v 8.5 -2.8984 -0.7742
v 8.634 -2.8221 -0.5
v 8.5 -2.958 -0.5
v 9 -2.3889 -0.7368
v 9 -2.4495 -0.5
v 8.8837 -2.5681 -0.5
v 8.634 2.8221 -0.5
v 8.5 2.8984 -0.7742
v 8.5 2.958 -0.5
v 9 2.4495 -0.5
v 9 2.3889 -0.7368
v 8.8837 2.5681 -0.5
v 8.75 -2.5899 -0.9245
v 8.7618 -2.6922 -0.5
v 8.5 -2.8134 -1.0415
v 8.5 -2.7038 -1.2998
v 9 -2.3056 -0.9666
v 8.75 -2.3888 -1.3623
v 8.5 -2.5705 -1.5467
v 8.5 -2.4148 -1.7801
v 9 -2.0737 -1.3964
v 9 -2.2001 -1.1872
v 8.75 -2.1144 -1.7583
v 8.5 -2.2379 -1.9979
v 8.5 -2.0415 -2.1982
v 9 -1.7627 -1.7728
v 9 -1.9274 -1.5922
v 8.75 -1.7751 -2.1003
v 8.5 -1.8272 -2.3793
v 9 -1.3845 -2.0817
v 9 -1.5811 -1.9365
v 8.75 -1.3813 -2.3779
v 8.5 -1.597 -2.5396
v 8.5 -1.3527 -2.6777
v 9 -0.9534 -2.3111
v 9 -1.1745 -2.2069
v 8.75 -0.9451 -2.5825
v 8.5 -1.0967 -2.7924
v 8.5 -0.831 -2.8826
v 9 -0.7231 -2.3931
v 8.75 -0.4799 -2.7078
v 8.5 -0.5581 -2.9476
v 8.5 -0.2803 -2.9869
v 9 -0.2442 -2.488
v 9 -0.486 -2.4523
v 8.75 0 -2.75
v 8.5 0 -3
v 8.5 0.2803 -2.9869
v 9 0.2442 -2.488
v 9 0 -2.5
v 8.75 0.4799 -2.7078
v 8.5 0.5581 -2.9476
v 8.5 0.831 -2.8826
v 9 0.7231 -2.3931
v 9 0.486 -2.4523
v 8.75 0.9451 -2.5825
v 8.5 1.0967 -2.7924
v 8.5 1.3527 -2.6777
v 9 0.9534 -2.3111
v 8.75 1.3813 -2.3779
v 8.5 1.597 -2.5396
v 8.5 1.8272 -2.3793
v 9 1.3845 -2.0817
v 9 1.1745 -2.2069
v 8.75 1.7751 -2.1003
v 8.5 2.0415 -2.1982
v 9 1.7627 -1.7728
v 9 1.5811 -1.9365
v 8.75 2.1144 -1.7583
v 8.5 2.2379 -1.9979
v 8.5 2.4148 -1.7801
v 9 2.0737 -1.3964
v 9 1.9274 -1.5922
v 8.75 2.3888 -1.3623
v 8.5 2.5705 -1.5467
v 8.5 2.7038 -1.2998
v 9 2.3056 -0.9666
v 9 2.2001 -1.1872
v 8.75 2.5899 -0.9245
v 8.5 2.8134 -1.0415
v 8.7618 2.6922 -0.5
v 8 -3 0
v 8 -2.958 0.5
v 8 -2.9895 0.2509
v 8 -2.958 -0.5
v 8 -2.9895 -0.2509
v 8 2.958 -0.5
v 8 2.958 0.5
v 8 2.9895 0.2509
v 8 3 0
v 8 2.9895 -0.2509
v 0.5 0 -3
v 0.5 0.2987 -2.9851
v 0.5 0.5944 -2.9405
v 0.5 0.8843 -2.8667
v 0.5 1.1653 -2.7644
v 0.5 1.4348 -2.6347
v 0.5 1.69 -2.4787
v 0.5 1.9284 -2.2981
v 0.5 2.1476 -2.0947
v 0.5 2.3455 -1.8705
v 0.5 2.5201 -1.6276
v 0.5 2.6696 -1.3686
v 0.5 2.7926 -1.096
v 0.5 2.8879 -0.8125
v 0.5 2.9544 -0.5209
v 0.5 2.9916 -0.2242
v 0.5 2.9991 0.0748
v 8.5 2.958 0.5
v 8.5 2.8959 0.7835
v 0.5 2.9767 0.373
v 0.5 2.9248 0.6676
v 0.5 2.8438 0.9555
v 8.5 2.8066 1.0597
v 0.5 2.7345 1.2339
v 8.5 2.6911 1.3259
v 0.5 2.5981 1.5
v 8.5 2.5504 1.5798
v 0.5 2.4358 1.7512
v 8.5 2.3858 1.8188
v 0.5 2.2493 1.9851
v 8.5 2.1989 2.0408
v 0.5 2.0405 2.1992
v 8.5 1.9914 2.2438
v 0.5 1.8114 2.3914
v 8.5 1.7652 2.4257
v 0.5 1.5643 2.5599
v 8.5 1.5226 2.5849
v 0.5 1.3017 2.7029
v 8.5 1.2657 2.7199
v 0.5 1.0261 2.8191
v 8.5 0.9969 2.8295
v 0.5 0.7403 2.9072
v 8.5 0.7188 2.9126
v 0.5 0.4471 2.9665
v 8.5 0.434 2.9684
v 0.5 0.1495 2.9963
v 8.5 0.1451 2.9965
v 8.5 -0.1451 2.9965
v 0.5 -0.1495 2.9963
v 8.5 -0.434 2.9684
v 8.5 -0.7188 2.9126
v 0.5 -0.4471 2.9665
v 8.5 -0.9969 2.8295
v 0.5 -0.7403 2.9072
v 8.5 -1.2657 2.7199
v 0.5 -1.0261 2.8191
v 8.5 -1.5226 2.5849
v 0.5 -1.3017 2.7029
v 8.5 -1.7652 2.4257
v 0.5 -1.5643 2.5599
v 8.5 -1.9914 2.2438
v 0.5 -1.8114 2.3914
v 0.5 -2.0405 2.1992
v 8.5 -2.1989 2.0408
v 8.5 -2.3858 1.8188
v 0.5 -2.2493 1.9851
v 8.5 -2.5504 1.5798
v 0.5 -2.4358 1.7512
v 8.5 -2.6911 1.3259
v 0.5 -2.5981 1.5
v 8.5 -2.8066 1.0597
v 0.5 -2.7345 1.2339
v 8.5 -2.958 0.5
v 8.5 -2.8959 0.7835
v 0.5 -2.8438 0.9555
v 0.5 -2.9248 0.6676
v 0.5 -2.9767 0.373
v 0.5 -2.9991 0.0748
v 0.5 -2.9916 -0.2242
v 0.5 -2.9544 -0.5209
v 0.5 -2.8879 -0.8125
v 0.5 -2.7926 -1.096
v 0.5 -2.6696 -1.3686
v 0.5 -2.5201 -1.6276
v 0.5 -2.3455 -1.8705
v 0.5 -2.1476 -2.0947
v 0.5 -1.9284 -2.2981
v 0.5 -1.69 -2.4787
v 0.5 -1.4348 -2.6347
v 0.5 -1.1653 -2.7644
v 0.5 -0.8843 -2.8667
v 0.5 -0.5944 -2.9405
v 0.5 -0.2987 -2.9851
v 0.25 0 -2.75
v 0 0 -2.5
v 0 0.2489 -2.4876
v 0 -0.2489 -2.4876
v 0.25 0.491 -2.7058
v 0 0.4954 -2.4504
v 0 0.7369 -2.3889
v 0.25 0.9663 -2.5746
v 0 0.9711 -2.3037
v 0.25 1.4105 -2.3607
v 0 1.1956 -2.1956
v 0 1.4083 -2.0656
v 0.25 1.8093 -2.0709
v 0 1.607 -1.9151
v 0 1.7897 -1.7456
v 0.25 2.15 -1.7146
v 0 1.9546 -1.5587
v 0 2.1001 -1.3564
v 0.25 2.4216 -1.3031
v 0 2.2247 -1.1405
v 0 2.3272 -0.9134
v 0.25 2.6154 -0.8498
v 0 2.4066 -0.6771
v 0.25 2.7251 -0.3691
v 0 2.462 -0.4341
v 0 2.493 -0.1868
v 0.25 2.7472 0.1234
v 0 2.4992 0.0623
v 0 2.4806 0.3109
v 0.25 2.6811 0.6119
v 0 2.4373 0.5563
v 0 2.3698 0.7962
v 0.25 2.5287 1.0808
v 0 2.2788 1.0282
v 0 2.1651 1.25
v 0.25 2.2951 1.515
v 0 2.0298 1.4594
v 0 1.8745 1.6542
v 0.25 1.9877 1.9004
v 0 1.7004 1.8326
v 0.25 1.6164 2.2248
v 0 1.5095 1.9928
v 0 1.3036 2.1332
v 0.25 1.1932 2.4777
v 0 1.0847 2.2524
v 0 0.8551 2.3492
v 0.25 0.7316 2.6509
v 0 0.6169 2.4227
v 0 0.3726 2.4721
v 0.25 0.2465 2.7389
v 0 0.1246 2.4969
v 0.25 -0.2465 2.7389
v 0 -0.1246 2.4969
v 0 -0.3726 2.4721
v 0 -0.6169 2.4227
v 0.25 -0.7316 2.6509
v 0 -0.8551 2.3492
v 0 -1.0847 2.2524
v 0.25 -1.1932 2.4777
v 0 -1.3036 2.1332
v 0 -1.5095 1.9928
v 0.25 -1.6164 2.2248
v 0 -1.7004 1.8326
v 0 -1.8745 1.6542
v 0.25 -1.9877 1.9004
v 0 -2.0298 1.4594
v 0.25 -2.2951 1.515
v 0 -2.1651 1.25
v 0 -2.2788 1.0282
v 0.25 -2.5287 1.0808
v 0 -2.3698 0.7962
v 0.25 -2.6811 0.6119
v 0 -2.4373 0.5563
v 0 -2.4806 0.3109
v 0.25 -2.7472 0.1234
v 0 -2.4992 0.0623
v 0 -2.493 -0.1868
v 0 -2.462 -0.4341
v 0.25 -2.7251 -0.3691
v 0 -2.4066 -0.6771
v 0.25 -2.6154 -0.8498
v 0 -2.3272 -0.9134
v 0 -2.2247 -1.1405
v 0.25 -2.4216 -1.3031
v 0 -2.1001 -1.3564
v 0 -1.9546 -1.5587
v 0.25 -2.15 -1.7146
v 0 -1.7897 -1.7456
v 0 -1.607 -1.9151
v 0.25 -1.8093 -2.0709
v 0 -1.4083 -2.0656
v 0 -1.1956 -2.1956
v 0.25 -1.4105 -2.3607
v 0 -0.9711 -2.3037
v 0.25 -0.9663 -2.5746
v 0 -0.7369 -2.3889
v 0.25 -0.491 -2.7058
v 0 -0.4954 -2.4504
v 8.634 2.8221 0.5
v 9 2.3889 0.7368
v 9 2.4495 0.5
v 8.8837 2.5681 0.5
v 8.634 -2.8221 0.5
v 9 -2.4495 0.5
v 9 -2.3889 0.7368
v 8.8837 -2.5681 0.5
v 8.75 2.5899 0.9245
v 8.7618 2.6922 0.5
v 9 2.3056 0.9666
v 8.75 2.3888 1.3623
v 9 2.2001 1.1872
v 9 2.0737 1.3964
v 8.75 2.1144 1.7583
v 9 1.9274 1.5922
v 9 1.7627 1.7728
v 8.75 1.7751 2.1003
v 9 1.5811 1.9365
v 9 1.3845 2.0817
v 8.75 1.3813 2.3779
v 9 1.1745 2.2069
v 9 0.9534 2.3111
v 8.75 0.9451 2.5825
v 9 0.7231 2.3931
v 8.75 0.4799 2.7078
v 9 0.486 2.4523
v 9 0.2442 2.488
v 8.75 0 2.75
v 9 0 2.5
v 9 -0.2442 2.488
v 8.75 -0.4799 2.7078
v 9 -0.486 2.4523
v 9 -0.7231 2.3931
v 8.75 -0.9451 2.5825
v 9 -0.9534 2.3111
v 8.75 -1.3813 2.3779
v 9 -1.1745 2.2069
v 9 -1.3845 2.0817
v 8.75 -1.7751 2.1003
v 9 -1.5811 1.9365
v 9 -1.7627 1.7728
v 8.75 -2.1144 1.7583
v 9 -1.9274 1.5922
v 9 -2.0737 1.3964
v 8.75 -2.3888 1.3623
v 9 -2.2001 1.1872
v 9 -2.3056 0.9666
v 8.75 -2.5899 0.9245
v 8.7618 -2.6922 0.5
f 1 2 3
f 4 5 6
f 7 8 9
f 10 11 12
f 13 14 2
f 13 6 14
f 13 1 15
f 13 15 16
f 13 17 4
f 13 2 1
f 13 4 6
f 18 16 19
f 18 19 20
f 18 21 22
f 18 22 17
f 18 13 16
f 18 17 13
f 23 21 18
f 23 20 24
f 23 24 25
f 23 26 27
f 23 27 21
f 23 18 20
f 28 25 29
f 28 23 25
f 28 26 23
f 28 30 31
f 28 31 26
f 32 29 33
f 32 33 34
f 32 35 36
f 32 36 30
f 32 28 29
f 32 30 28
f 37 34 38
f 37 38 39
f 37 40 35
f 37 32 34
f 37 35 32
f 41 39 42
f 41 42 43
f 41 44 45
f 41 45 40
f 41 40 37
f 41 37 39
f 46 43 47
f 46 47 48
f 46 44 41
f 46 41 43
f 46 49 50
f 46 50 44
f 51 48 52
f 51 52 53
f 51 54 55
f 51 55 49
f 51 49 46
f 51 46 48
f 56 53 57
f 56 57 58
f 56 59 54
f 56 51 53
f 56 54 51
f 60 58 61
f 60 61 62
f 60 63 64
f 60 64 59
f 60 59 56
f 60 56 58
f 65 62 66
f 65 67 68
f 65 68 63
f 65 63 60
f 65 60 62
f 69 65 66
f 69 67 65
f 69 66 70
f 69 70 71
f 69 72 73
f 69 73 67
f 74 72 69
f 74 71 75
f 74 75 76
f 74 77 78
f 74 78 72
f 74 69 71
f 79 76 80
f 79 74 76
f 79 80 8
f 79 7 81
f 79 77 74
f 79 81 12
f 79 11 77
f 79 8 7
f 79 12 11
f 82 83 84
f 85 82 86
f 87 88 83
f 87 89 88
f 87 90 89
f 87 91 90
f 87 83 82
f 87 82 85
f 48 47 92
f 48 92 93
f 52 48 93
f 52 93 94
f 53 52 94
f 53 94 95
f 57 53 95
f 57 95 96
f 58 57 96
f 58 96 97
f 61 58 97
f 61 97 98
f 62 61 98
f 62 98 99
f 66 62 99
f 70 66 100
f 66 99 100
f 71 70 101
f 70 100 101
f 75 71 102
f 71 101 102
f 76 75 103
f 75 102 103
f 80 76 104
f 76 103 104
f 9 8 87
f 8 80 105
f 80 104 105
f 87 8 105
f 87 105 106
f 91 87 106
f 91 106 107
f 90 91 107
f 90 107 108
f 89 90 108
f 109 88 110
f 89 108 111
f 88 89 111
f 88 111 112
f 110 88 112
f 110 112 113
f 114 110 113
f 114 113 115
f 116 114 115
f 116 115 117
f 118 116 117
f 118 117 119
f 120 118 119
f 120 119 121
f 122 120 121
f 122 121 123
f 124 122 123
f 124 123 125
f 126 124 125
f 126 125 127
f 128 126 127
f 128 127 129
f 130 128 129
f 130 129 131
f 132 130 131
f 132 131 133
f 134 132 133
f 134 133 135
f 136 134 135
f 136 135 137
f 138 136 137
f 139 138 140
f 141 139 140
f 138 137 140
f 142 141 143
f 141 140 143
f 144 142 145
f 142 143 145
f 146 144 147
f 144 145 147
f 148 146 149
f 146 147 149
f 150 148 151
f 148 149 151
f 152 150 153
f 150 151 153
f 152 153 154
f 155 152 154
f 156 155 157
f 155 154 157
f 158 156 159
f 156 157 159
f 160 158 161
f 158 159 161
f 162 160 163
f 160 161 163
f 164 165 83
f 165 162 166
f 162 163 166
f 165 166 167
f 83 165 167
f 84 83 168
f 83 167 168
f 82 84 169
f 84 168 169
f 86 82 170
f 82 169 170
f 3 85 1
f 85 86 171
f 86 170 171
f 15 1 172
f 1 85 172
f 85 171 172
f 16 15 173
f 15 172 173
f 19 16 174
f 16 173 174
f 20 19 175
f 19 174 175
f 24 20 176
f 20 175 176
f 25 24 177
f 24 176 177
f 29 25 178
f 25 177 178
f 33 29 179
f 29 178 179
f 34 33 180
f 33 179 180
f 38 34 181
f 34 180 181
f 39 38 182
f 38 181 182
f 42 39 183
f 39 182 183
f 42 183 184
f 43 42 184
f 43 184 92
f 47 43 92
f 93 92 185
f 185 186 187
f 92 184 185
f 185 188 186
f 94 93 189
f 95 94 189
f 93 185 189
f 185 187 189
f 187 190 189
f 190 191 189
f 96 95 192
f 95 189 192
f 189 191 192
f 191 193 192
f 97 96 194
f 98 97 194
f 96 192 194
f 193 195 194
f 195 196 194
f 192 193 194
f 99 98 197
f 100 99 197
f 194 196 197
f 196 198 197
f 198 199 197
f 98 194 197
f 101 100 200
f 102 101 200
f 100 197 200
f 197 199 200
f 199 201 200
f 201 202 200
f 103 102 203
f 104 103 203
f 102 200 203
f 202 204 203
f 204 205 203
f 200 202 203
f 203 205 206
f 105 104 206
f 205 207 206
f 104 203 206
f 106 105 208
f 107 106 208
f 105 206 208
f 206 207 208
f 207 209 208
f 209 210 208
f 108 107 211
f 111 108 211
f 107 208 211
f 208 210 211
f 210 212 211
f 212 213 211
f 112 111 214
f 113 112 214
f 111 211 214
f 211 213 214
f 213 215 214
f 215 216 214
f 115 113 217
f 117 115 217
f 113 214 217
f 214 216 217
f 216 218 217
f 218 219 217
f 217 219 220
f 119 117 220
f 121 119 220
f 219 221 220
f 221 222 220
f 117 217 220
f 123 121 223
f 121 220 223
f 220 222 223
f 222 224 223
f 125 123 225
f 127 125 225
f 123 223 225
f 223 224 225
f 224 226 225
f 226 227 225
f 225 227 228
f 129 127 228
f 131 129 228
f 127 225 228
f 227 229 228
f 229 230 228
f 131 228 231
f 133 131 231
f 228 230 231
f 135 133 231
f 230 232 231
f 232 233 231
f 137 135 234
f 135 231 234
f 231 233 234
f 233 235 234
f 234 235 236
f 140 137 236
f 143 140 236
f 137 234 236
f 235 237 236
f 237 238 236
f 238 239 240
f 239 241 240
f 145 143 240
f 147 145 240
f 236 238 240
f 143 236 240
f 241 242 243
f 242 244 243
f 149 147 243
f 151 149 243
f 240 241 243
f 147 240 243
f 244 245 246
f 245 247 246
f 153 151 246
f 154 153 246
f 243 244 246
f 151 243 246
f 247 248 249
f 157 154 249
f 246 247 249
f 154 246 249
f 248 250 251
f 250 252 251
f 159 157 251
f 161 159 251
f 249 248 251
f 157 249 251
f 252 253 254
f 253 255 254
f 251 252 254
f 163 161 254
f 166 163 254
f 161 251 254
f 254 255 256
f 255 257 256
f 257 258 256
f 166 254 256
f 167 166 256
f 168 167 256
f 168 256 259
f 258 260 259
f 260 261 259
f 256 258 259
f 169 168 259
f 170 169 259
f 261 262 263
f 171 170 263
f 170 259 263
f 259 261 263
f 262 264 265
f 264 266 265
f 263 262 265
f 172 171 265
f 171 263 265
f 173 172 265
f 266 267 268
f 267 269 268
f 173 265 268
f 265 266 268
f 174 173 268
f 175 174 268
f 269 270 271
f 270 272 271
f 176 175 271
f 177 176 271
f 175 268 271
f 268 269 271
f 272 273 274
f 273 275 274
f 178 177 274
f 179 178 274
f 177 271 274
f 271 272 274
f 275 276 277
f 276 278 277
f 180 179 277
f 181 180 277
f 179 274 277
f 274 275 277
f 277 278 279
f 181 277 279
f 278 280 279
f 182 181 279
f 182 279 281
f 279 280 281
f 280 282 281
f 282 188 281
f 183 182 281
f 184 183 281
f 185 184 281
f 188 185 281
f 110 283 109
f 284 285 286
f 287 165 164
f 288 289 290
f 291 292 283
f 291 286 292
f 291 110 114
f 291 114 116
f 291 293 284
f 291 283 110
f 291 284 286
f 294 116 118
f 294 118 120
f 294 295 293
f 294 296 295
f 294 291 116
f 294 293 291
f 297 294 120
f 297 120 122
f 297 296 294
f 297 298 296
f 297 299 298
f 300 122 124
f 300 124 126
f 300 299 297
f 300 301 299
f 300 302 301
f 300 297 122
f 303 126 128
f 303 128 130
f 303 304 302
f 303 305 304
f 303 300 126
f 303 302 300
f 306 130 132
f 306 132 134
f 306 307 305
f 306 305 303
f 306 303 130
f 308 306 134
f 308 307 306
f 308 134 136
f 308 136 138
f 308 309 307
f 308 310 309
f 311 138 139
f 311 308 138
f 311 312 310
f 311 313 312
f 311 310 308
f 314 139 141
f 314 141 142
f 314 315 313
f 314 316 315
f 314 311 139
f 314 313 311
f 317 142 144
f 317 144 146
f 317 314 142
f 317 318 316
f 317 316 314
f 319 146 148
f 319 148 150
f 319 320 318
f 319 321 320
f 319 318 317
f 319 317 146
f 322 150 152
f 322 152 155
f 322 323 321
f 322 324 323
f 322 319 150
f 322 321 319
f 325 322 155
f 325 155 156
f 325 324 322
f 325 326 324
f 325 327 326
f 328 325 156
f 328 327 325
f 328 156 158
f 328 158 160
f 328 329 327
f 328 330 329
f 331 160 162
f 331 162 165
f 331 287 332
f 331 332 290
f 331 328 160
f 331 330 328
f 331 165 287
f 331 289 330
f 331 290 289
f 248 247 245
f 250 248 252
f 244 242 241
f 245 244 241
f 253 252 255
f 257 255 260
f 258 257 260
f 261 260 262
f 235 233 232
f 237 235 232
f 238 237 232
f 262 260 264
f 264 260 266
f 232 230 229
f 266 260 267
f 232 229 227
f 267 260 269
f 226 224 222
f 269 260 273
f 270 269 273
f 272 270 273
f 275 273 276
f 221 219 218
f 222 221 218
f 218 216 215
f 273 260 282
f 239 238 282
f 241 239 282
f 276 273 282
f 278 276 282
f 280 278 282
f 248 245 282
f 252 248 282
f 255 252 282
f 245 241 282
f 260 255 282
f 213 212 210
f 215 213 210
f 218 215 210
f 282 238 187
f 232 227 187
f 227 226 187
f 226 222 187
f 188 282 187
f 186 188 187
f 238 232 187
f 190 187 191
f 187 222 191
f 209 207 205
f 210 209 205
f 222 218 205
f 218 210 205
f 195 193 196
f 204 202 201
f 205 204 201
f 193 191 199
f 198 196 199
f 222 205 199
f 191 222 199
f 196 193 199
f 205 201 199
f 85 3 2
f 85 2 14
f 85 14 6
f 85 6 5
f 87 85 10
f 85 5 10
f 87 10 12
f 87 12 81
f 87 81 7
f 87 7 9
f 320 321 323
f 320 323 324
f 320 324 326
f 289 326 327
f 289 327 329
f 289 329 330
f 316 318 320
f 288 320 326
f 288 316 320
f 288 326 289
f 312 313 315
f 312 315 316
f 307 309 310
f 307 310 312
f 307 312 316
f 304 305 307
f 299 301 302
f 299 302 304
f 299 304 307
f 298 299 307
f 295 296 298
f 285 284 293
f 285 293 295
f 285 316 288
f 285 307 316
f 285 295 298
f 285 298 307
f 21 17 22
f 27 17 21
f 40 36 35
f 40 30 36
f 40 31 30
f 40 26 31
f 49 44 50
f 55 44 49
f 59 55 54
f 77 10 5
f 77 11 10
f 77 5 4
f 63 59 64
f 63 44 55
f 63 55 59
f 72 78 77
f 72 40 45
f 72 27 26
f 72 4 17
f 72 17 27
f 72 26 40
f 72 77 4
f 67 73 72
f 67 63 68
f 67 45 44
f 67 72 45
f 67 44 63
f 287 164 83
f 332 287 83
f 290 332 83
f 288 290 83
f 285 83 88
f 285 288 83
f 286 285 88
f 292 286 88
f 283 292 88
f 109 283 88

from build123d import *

# Parameters (mm, degrees)
CROQUIS1_R              = 3
SALIENTE_EXTRUIR1_DEPTH = 9
CROQUIS2_W              = 1
CROQUIS2_H              = 7
CORTAR_EXTRUIR1_DEPTH   = 1
CHAFL_N1_SIZE           = 0.5


with BuildPart() as part:
    # Croquis1 → Saliente-Extruir1 (new body)
    with BuildSketch(Plane(origin=(0, 0, 0), x_dir=(0, 0, -1), z_dir=(1, 0, 0))):
        Circle(CROQUIS1_R)
    extrude(amount=SALIENTE_EXTRUIR1_DEPTH)

    # Croquis2 → Cortar-Extruir1 (cut)
    with BuildSketch(Plane(origin=(9, 0, 0), x_dir=(0, 0, -1), z_dir=(1, 0, 0))):
        Rectangle(CROQUIS2_W, CROQUIS2_H)
    extrude(amount=-CORTAR_EXTRUIR1_DEPTH, mode=Mode.SUBTRACT)

    # Chaflán1
    chafl_n1_edges = [part.edges().sort_by_distance(p)[0] for p in [
        (0, 0, 3),
        (9, 0, 3),
        (9, -1.936491673, -2.291287847),
    ]]
    chamfer(chafl_n1_edges, length=CHAFL_N1_SIZE)


solid = part.part
